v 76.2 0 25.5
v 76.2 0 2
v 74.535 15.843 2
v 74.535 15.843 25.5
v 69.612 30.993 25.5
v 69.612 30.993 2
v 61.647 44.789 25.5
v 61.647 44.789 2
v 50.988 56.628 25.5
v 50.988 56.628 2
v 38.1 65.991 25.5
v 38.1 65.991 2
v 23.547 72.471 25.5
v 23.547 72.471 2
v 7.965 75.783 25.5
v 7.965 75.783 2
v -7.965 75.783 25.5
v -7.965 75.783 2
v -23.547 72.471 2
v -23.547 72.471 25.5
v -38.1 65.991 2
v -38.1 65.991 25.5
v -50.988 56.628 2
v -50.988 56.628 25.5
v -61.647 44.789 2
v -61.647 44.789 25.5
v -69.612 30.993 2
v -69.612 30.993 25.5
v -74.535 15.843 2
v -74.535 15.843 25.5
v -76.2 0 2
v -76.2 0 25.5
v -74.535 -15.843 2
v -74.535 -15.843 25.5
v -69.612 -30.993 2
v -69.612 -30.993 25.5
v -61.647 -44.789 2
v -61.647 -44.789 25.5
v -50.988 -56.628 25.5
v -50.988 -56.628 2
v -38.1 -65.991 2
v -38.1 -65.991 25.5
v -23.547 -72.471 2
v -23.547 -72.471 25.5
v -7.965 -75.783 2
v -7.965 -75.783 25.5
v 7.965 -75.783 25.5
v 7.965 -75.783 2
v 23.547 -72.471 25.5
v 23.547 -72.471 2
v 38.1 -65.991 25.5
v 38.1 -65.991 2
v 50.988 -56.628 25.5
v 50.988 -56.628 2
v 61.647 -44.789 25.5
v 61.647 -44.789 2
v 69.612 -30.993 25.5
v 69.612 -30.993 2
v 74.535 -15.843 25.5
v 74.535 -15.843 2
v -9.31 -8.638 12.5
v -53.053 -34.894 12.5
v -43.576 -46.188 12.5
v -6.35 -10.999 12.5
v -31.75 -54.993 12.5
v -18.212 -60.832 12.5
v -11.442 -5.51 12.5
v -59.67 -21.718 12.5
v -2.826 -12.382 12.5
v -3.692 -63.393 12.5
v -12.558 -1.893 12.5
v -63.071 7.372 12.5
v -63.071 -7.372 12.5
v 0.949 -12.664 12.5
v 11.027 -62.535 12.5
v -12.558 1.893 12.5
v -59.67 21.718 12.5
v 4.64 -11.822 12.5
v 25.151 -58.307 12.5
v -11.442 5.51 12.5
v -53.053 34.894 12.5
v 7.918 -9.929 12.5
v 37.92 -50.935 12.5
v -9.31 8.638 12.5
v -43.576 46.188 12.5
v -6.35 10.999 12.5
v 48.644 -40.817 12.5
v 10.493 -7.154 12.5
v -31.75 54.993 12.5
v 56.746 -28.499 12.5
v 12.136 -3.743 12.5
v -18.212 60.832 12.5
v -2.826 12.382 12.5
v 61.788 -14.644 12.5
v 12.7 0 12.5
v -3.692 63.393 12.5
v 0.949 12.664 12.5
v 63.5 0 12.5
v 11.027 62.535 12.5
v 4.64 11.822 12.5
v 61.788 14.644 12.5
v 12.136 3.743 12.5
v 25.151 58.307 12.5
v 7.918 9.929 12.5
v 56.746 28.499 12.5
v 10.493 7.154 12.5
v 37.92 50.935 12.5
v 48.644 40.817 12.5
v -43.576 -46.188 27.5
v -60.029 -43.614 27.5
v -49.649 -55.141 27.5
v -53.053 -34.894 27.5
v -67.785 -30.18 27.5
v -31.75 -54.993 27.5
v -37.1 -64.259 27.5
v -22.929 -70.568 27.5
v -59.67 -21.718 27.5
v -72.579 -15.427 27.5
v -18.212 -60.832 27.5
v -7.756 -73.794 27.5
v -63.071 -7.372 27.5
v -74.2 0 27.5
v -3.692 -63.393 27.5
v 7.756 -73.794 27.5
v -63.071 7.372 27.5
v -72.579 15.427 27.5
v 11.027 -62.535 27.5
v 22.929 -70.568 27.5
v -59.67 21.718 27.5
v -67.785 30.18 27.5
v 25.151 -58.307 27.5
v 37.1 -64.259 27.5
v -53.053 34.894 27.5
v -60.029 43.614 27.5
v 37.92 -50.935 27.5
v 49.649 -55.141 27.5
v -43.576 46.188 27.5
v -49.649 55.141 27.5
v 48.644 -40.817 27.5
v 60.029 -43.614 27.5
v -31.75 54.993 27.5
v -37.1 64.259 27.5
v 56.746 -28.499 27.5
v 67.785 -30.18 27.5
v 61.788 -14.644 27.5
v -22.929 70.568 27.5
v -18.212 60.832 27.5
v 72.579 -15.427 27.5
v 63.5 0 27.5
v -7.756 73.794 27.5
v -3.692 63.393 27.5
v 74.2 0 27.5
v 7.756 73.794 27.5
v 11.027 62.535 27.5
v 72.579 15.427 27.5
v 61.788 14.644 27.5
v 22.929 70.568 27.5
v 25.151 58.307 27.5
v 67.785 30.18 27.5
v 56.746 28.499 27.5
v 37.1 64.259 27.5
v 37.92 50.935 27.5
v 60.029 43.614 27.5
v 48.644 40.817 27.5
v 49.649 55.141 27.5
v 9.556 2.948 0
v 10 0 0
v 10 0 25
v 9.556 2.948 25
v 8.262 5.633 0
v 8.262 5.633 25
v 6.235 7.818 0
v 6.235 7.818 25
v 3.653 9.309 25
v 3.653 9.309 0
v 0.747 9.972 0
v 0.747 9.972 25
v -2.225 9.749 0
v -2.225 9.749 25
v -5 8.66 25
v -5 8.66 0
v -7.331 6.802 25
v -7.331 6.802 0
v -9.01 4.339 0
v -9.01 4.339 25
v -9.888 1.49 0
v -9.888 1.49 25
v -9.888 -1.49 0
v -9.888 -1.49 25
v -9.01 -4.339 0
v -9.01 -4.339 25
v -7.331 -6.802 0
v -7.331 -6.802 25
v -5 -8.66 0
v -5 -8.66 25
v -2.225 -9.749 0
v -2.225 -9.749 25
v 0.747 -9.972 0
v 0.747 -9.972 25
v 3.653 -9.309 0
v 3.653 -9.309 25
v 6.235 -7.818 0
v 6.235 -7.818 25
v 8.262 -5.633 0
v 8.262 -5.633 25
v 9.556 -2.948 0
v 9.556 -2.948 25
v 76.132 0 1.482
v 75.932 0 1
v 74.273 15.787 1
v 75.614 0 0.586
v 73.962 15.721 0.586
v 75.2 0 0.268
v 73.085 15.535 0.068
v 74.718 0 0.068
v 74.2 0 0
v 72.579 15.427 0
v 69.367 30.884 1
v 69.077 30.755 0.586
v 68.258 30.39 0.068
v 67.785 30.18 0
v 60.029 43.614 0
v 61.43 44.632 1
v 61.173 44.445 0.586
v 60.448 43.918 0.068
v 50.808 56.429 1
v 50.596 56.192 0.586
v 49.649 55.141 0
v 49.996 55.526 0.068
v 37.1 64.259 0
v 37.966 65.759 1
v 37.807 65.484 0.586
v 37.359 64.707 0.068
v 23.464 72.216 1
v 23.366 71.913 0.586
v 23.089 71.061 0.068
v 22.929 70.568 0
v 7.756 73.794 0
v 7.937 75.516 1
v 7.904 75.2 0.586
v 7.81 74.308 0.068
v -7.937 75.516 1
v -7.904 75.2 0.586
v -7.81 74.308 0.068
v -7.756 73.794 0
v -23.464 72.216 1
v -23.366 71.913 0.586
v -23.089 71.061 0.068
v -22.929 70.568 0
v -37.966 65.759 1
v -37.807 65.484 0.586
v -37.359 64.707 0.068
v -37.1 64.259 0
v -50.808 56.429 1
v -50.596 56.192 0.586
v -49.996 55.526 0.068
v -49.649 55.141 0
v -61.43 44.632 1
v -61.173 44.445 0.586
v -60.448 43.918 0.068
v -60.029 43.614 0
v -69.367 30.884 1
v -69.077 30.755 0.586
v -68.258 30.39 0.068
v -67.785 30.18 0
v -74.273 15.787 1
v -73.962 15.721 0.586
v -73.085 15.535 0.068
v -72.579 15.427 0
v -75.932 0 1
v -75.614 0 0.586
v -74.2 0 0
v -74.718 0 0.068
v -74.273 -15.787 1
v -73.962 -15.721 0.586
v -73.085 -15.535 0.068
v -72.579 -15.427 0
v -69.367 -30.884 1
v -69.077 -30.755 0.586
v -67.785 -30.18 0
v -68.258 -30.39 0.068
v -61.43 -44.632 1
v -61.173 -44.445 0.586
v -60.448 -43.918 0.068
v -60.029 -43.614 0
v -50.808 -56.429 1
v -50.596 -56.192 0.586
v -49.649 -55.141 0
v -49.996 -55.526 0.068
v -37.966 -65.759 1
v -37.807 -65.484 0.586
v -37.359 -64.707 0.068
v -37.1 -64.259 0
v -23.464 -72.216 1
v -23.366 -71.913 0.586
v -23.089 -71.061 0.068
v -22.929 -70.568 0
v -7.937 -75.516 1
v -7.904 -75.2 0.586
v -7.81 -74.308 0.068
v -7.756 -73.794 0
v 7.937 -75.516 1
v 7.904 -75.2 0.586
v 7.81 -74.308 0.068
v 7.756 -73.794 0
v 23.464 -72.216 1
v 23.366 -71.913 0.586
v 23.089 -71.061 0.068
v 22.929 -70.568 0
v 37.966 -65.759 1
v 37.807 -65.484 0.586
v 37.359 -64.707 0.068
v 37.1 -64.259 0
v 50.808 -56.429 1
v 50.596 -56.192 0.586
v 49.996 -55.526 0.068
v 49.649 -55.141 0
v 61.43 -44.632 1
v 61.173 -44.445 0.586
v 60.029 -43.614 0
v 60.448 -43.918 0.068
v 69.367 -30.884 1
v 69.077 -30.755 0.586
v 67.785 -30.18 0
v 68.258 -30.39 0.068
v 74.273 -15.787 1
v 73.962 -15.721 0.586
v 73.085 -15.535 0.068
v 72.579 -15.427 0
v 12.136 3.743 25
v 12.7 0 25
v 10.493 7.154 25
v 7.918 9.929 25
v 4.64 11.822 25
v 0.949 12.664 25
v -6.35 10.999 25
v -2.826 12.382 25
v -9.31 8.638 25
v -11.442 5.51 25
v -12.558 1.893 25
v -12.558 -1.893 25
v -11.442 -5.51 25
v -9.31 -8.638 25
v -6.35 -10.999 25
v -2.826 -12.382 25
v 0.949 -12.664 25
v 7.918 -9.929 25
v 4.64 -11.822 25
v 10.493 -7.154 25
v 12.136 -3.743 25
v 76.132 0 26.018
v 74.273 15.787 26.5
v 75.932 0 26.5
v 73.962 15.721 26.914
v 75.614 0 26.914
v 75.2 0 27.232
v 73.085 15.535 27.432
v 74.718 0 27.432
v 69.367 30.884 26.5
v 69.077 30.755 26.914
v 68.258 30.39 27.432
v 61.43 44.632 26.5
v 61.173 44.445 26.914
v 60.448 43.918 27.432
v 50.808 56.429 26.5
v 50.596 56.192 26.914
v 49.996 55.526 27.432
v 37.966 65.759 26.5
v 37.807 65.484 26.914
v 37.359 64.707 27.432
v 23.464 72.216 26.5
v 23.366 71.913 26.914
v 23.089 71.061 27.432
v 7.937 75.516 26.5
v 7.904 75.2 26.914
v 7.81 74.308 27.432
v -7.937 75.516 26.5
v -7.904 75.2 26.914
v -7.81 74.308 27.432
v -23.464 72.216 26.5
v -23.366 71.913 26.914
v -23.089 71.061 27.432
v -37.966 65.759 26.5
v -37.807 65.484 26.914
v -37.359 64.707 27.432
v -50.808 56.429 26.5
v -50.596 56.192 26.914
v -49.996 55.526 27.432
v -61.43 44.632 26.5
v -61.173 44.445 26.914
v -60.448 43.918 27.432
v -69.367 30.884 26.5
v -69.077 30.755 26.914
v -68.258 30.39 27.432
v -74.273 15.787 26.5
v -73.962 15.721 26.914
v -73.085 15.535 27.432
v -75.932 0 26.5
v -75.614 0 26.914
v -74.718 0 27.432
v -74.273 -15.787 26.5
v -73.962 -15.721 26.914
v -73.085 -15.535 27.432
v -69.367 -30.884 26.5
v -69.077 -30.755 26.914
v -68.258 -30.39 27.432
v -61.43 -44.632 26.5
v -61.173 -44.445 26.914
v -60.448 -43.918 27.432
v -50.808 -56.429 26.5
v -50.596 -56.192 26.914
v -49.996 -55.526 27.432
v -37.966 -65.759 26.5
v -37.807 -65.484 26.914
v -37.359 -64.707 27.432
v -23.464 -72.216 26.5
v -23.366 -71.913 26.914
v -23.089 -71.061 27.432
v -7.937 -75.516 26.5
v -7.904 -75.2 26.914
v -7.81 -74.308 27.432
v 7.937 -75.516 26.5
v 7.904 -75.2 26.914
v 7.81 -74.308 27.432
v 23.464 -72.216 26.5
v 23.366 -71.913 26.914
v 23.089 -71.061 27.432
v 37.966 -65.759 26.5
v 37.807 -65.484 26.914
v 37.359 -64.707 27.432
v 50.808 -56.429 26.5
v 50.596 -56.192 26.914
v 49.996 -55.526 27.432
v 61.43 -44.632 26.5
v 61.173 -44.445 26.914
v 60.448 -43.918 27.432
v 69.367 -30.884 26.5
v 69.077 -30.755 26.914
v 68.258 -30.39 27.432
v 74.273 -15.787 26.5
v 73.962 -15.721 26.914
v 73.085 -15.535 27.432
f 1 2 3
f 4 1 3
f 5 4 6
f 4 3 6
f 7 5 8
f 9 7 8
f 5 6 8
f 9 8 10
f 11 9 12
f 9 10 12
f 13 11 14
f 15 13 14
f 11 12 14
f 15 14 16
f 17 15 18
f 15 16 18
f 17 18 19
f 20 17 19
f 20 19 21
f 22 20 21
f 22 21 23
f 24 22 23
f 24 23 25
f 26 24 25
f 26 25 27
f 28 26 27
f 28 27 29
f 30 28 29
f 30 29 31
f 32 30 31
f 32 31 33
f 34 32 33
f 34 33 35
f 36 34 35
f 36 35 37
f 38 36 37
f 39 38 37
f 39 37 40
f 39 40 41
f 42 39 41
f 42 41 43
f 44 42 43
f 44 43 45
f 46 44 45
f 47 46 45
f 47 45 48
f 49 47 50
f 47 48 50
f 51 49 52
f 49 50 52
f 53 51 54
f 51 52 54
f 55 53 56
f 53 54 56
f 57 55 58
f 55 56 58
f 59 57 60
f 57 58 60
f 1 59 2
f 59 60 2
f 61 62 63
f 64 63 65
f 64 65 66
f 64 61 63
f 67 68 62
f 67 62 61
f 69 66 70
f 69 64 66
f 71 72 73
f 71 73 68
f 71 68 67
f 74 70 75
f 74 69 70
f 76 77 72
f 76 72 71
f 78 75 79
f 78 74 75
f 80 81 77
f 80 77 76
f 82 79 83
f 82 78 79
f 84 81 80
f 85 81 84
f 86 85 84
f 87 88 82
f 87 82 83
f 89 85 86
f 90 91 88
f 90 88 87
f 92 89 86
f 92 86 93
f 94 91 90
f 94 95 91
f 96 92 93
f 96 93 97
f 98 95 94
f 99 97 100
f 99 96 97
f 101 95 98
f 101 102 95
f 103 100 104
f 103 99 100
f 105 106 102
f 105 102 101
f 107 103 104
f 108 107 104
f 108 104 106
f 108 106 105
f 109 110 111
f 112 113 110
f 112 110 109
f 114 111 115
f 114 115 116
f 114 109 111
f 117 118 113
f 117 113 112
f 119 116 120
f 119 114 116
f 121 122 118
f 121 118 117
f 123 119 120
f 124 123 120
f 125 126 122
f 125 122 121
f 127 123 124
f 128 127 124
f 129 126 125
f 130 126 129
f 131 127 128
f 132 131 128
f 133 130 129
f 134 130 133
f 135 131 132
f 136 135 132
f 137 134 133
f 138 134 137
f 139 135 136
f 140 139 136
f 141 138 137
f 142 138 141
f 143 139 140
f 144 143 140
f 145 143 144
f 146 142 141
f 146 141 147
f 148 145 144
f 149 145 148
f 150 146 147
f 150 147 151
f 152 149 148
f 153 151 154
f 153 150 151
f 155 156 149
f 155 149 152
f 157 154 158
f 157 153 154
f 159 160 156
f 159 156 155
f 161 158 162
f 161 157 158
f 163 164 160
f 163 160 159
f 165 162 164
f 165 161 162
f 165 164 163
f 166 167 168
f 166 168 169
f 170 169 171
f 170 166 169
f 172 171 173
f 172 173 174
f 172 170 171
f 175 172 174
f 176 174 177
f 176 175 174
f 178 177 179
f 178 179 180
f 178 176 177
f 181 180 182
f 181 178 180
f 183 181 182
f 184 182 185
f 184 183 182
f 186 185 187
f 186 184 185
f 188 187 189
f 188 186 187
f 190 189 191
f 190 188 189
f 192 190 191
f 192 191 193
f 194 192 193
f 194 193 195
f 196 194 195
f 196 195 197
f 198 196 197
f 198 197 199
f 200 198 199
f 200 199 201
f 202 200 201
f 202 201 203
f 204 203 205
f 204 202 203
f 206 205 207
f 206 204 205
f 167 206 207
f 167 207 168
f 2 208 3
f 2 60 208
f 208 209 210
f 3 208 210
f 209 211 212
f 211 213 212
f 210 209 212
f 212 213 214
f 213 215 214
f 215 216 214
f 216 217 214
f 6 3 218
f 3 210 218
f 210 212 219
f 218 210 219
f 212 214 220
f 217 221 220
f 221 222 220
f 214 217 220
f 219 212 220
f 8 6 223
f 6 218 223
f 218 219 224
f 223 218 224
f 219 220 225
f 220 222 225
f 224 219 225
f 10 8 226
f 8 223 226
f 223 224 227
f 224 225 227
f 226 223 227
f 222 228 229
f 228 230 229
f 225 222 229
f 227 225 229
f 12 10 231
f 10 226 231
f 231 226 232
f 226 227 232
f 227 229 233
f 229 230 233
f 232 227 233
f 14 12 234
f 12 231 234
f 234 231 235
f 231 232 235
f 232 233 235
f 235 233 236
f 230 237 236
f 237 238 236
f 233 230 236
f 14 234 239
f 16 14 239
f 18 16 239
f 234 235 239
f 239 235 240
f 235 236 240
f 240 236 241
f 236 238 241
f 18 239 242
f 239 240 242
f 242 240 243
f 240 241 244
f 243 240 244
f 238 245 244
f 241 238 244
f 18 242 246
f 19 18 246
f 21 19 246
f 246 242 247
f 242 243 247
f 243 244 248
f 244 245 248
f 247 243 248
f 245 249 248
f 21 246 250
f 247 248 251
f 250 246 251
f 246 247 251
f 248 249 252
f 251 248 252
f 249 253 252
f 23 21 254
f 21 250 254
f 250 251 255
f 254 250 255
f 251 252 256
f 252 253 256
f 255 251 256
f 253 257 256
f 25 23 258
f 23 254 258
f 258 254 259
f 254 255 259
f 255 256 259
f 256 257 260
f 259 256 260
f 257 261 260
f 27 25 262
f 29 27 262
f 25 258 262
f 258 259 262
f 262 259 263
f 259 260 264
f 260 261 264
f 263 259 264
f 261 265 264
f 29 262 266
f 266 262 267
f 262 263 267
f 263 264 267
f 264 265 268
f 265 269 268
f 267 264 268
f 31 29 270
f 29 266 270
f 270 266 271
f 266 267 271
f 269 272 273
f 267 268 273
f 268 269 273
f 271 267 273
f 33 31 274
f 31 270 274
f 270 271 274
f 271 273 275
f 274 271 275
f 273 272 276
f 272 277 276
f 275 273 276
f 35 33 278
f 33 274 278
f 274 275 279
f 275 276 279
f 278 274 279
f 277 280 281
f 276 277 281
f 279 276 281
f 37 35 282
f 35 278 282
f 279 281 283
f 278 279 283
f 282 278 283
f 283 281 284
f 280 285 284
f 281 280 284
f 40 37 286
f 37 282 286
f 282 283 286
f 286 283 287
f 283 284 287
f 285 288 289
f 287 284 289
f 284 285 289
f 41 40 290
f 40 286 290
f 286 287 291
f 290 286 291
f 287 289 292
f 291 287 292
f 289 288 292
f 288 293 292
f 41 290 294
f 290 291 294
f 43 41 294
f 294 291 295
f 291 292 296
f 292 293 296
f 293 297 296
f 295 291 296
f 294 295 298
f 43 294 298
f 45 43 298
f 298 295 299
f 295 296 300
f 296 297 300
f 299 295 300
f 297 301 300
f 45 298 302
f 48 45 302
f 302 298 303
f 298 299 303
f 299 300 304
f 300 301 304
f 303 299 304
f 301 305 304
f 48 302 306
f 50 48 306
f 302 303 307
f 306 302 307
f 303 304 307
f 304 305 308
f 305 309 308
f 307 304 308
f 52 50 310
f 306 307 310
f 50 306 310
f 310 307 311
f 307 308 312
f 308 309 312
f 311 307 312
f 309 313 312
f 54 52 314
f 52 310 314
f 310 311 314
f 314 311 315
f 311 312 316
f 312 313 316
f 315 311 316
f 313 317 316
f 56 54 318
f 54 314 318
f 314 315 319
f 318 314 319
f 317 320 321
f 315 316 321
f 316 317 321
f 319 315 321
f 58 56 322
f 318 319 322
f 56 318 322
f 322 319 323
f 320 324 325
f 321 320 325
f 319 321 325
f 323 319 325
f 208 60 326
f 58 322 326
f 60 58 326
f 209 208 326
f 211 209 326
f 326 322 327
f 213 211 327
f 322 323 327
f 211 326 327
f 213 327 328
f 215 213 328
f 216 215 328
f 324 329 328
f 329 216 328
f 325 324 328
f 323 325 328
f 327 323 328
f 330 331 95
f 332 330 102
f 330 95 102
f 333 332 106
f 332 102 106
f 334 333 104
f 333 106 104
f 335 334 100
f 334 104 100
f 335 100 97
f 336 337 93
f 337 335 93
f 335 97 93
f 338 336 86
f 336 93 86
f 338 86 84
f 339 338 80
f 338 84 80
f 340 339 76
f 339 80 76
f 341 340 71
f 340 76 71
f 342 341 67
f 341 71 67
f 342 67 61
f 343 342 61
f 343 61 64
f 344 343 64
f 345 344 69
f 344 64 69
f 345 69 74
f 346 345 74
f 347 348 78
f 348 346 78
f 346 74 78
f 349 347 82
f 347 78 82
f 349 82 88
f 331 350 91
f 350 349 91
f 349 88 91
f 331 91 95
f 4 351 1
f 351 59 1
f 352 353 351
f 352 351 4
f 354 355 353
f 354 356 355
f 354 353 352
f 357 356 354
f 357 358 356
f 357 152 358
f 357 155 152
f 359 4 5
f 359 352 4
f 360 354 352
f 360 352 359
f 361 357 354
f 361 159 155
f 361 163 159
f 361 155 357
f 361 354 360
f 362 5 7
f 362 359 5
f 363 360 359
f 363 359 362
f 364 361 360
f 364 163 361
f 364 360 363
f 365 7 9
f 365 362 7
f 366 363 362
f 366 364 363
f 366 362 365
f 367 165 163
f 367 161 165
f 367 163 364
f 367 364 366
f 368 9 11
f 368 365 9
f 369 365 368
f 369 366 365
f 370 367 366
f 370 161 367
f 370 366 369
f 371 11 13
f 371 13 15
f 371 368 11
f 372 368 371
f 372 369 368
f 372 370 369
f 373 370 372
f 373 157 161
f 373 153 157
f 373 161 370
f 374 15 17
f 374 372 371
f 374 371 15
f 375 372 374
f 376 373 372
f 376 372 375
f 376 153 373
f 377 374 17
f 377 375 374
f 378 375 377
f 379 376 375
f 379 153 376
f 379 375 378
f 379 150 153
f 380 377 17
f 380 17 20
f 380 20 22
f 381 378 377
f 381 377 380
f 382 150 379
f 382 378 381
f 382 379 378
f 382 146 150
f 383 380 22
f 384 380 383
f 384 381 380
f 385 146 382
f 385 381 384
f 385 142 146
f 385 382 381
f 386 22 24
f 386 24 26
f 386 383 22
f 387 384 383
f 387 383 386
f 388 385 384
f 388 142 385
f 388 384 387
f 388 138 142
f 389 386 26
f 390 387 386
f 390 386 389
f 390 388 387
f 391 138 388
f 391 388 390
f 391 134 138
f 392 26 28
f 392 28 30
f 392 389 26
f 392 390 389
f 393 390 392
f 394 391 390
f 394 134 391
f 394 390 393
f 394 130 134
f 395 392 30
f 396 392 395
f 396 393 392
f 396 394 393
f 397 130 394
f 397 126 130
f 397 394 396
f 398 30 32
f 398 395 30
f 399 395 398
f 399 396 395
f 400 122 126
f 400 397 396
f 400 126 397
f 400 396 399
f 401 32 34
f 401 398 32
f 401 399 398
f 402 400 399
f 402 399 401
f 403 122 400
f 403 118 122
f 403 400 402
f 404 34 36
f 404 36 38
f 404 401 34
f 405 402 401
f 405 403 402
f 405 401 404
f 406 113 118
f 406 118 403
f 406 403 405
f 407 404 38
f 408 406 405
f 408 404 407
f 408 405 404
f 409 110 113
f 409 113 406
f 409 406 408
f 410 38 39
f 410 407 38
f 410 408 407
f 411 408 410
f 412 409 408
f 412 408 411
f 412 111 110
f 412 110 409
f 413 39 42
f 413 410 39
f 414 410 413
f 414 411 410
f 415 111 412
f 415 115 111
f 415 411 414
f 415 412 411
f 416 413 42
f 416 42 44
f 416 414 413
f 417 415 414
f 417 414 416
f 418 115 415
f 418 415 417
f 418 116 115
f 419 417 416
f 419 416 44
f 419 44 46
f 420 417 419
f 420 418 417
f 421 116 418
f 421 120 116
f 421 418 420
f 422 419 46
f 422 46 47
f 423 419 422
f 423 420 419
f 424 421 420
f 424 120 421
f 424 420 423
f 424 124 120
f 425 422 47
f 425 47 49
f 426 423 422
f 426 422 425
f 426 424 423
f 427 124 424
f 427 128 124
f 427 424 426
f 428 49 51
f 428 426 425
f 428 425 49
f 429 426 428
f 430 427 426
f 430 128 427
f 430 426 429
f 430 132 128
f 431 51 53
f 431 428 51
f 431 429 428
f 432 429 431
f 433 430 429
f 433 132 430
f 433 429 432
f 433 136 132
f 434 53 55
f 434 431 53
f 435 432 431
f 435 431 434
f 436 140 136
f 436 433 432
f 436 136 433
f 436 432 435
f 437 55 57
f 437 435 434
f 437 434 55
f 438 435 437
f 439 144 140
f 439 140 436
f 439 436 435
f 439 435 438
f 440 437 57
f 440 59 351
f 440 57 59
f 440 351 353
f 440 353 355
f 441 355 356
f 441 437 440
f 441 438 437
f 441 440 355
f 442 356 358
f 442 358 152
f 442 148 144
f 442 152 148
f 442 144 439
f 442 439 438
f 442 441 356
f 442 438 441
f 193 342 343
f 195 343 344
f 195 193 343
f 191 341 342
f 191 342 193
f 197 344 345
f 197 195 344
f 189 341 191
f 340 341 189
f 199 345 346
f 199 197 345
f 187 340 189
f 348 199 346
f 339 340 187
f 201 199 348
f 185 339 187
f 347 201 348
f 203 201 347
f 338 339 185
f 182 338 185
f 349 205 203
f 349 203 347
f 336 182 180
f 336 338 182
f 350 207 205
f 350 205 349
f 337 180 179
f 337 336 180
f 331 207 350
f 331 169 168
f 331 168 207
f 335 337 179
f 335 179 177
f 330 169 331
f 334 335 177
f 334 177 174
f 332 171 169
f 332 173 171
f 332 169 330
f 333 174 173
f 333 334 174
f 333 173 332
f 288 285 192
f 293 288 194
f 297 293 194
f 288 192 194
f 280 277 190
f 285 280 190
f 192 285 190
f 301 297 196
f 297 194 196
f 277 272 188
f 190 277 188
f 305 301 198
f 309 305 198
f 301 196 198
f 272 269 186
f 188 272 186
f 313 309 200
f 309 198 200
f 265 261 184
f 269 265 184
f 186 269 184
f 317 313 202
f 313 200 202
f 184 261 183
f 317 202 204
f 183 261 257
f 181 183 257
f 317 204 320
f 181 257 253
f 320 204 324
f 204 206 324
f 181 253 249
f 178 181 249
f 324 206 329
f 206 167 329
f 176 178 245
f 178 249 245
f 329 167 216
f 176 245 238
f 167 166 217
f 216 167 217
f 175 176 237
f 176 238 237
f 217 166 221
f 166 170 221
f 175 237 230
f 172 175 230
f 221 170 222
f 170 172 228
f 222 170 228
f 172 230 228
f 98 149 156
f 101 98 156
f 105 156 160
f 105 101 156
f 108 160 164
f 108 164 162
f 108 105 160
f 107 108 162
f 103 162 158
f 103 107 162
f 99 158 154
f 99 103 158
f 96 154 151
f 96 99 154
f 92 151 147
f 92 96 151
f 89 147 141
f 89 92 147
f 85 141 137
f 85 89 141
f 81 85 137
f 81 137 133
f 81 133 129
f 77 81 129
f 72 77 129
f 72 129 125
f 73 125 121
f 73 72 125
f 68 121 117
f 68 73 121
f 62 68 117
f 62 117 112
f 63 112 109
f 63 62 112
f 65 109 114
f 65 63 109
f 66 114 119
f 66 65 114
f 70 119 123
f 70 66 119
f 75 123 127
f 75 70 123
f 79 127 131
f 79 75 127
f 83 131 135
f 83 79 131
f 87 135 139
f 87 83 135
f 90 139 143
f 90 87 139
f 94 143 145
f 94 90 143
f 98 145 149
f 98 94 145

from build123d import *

# Parameters (mm, degrees)
SKETCH1_R           = 76.2
SKETCH1_R_2         = 50.8
SKETCH1_R_3         = 10
BOSS_EXTRUDE2_DEPTH = 25
SKETCH3_R           = 76.2
SKETCH3_R_2         = 12.7
CUT_EXTRUDE1_DEPTH  = 12.5
SKETCH4_R           = 76.2
SKETCH4_R_2         = 63.5
BOSS_EXTRUDE3_DEPTH = 15
FILLET2_R           = 2


with BuildPart() as part:
    # Sketch1 → Boss-Extrude2 (new body)
    # profile 1 of 2: a face of its own
    with BuildSketch(Plane.XY):
        Circle(SKETCH1_R)
        Circle(SKETCH1_R_2, mode=Mode.SUBTRACT)
    # profile 2 of 2: a face of its own
    with BuildSketch(Plane.XY):
        Circle(SKETCH1_R_2)
        Circle(SKETCH1_R_3, mode=Mode.SUBTRACT)
    extrude(amount=BOSS_EXTRUDE2_DEPTH)

    # Sketch3 → Cut-Extrude1 (cut, symmetric)
    with BuildSketch(Plane.XY.offset(25)):
        Circle(SKETCH3_R)
        Circle(SKETCH3_R_2, mode=Mode.SUBTRACT)
    extrude(amount=CUT_EXTRUDE1_DEPTH, both=True, mode=Mode.SUBTRACT)

    # Sketch4 → Boss-Extrude3 (add)
    with BuildSketch(Plane.XY.offset(12.5)):
        Circle(SKETCH4_R)
        Circle(SKETCH4_R_2, mode=Mode.SUBTRACT)
    extrude(amount=BOSS_EXTRUDE3_DEPTH)

    # Fillet2
    fillet2_edges = [part.edges().sort_by_distance(p)[0] for p in [
        (-76.2, 0, 27.5),
        (-76.2, 0, 0),
    ]]
    fillet(fillet2_edges, radius=FILLET2_R)


solid = part.part
